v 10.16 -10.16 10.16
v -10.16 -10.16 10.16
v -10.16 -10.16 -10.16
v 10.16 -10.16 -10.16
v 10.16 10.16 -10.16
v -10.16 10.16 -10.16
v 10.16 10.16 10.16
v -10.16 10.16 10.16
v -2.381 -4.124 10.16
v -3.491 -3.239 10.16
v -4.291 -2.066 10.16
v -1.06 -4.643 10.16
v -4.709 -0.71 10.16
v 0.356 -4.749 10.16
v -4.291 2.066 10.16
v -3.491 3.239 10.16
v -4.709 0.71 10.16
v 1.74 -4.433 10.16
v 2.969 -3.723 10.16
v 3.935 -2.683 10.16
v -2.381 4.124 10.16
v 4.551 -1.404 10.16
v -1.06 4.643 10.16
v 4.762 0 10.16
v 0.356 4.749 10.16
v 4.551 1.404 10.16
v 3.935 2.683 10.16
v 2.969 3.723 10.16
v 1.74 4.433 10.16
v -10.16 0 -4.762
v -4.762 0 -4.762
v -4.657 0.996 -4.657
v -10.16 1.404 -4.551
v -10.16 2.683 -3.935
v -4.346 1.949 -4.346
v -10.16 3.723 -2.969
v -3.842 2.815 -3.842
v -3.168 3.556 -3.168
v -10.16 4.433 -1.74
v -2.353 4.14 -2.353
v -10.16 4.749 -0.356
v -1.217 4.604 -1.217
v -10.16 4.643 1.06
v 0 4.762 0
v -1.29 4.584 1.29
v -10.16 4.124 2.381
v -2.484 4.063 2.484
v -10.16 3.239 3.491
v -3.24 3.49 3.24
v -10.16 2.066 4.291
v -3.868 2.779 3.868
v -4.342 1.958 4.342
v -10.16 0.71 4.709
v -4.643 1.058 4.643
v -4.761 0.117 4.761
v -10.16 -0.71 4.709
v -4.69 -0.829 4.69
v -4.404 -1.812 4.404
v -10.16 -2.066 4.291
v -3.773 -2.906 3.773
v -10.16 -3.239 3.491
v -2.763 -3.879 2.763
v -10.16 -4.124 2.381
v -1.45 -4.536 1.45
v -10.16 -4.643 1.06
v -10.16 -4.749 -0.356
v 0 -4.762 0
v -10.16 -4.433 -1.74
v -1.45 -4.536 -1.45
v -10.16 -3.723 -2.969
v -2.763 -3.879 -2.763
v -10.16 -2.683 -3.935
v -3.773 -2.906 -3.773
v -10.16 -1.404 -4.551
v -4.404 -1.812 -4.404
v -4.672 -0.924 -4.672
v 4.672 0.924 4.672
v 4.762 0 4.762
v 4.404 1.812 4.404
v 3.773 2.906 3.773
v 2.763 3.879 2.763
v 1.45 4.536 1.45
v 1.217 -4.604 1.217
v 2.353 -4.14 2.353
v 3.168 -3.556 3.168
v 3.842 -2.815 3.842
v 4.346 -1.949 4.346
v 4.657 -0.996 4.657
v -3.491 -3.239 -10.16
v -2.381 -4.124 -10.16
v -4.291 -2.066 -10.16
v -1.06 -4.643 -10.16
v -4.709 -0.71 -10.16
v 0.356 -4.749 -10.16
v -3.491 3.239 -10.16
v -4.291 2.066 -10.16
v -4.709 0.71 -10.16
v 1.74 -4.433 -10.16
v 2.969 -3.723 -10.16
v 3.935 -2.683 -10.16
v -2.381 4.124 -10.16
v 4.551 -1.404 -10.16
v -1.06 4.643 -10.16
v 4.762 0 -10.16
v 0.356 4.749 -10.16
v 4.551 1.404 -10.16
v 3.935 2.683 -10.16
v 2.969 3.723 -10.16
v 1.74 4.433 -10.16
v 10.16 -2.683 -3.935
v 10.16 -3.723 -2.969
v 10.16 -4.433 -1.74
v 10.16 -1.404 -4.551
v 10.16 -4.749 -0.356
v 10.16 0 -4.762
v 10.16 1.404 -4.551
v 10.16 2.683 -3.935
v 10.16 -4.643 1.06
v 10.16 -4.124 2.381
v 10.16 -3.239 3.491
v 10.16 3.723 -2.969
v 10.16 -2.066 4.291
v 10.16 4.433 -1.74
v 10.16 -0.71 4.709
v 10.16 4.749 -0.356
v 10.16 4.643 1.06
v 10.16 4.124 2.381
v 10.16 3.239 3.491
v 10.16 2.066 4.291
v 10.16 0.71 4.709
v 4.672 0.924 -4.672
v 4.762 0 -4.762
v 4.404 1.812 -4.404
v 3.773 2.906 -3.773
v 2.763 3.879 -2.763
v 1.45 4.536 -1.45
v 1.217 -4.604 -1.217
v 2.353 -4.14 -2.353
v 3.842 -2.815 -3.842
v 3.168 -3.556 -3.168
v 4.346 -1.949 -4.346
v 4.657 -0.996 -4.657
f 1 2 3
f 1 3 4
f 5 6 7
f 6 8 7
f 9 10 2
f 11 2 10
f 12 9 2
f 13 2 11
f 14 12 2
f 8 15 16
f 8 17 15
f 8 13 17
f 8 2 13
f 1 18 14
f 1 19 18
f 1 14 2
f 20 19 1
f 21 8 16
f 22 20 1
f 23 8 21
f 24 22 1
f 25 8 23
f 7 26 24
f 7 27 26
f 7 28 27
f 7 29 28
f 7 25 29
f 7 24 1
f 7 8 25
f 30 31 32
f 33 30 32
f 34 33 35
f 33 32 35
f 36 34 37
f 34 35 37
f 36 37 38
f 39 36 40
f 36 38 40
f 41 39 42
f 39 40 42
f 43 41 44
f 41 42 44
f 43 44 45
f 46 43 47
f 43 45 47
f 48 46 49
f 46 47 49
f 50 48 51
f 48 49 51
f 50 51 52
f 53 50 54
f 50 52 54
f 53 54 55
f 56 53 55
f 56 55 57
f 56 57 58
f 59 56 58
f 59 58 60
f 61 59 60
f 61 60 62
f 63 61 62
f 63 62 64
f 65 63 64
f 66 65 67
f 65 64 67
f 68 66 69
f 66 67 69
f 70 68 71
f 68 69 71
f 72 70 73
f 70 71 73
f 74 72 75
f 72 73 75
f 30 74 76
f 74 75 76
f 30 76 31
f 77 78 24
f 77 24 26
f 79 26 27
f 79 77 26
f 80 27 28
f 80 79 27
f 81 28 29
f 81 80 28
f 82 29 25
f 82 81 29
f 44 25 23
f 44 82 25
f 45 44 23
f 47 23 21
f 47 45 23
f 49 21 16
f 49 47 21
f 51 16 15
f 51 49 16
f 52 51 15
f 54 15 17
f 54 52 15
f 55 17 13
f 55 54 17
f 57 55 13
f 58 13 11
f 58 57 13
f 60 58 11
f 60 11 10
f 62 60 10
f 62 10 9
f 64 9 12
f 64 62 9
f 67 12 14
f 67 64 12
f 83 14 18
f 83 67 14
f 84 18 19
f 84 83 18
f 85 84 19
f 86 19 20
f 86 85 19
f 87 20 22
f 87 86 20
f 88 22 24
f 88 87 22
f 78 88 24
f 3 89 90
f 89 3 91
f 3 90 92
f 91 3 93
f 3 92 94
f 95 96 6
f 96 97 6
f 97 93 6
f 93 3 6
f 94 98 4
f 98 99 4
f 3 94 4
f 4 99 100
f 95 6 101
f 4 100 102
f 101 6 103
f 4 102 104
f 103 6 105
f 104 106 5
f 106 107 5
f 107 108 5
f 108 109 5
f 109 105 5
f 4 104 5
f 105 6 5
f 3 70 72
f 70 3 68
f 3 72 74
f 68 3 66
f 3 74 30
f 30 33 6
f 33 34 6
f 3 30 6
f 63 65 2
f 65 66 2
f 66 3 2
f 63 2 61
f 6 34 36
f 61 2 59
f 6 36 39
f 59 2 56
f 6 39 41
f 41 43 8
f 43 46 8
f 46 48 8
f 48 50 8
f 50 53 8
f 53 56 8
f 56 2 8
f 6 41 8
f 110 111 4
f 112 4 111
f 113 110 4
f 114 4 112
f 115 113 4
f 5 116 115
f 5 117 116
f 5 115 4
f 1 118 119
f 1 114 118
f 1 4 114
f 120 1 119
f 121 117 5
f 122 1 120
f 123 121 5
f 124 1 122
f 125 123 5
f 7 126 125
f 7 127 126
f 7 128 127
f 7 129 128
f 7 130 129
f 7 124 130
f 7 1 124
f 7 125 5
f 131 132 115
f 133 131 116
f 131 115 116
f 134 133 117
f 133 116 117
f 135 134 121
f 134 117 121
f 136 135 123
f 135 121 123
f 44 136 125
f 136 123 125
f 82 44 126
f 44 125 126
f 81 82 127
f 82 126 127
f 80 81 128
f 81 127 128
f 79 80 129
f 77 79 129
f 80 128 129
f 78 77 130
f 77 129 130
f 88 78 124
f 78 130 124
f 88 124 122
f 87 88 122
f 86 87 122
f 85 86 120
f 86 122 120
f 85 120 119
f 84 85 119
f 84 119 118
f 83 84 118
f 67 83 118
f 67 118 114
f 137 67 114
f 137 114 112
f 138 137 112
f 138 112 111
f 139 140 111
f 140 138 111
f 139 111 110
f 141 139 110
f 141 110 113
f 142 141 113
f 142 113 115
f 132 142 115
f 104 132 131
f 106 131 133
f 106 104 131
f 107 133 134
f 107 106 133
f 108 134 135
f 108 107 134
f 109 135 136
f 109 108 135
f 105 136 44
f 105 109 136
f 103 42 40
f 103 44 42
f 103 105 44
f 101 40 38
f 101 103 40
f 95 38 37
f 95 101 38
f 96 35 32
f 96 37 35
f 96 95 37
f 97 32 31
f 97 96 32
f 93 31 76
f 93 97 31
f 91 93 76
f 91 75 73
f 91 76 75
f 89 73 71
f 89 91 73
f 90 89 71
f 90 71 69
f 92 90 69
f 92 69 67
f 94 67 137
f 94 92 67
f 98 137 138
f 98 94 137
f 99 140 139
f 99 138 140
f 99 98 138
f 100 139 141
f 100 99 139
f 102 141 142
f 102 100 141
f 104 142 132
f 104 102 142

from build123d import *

# Parameters (mm, degrees)
SKETCH1_W           = 20.32
SKETCH1_H           = 20.32
SKETCH1_R           = 4.7625
BOSS_EXTRUDE1_DEPTH = 10.16
SKETCH2_R           = 4.7625
CUT_EXTRUDE1_DEPTH  = 21.32


with BuildPart() as part:
    # Sketch1 → Boss-Extrude1 (new body, symmetric)
    with BuildSketch(Plane.XY):
        Rectangle(SKETCH1_W, SKETCH1_H)
        Circle(SKETCH1_R, mode=Mode.SUBTRACT)
    extrude(amount=BOSS_EXTRUDE1_DEPTH, both=True)

    # Sketch2 → Cut-Extrude1 (cut, through all)
    with BuildSketch(Plane(origin=(10.16, 0, 0), x_dir=(0, 0, -1), z_dir=(1, 0, 0))):
        Circle(SKETCH2_R)
    extrude(amount=-CUT_EXTRUDE1_DEPTH, mode=Mode.SUBTRACT)


solid = part.part
